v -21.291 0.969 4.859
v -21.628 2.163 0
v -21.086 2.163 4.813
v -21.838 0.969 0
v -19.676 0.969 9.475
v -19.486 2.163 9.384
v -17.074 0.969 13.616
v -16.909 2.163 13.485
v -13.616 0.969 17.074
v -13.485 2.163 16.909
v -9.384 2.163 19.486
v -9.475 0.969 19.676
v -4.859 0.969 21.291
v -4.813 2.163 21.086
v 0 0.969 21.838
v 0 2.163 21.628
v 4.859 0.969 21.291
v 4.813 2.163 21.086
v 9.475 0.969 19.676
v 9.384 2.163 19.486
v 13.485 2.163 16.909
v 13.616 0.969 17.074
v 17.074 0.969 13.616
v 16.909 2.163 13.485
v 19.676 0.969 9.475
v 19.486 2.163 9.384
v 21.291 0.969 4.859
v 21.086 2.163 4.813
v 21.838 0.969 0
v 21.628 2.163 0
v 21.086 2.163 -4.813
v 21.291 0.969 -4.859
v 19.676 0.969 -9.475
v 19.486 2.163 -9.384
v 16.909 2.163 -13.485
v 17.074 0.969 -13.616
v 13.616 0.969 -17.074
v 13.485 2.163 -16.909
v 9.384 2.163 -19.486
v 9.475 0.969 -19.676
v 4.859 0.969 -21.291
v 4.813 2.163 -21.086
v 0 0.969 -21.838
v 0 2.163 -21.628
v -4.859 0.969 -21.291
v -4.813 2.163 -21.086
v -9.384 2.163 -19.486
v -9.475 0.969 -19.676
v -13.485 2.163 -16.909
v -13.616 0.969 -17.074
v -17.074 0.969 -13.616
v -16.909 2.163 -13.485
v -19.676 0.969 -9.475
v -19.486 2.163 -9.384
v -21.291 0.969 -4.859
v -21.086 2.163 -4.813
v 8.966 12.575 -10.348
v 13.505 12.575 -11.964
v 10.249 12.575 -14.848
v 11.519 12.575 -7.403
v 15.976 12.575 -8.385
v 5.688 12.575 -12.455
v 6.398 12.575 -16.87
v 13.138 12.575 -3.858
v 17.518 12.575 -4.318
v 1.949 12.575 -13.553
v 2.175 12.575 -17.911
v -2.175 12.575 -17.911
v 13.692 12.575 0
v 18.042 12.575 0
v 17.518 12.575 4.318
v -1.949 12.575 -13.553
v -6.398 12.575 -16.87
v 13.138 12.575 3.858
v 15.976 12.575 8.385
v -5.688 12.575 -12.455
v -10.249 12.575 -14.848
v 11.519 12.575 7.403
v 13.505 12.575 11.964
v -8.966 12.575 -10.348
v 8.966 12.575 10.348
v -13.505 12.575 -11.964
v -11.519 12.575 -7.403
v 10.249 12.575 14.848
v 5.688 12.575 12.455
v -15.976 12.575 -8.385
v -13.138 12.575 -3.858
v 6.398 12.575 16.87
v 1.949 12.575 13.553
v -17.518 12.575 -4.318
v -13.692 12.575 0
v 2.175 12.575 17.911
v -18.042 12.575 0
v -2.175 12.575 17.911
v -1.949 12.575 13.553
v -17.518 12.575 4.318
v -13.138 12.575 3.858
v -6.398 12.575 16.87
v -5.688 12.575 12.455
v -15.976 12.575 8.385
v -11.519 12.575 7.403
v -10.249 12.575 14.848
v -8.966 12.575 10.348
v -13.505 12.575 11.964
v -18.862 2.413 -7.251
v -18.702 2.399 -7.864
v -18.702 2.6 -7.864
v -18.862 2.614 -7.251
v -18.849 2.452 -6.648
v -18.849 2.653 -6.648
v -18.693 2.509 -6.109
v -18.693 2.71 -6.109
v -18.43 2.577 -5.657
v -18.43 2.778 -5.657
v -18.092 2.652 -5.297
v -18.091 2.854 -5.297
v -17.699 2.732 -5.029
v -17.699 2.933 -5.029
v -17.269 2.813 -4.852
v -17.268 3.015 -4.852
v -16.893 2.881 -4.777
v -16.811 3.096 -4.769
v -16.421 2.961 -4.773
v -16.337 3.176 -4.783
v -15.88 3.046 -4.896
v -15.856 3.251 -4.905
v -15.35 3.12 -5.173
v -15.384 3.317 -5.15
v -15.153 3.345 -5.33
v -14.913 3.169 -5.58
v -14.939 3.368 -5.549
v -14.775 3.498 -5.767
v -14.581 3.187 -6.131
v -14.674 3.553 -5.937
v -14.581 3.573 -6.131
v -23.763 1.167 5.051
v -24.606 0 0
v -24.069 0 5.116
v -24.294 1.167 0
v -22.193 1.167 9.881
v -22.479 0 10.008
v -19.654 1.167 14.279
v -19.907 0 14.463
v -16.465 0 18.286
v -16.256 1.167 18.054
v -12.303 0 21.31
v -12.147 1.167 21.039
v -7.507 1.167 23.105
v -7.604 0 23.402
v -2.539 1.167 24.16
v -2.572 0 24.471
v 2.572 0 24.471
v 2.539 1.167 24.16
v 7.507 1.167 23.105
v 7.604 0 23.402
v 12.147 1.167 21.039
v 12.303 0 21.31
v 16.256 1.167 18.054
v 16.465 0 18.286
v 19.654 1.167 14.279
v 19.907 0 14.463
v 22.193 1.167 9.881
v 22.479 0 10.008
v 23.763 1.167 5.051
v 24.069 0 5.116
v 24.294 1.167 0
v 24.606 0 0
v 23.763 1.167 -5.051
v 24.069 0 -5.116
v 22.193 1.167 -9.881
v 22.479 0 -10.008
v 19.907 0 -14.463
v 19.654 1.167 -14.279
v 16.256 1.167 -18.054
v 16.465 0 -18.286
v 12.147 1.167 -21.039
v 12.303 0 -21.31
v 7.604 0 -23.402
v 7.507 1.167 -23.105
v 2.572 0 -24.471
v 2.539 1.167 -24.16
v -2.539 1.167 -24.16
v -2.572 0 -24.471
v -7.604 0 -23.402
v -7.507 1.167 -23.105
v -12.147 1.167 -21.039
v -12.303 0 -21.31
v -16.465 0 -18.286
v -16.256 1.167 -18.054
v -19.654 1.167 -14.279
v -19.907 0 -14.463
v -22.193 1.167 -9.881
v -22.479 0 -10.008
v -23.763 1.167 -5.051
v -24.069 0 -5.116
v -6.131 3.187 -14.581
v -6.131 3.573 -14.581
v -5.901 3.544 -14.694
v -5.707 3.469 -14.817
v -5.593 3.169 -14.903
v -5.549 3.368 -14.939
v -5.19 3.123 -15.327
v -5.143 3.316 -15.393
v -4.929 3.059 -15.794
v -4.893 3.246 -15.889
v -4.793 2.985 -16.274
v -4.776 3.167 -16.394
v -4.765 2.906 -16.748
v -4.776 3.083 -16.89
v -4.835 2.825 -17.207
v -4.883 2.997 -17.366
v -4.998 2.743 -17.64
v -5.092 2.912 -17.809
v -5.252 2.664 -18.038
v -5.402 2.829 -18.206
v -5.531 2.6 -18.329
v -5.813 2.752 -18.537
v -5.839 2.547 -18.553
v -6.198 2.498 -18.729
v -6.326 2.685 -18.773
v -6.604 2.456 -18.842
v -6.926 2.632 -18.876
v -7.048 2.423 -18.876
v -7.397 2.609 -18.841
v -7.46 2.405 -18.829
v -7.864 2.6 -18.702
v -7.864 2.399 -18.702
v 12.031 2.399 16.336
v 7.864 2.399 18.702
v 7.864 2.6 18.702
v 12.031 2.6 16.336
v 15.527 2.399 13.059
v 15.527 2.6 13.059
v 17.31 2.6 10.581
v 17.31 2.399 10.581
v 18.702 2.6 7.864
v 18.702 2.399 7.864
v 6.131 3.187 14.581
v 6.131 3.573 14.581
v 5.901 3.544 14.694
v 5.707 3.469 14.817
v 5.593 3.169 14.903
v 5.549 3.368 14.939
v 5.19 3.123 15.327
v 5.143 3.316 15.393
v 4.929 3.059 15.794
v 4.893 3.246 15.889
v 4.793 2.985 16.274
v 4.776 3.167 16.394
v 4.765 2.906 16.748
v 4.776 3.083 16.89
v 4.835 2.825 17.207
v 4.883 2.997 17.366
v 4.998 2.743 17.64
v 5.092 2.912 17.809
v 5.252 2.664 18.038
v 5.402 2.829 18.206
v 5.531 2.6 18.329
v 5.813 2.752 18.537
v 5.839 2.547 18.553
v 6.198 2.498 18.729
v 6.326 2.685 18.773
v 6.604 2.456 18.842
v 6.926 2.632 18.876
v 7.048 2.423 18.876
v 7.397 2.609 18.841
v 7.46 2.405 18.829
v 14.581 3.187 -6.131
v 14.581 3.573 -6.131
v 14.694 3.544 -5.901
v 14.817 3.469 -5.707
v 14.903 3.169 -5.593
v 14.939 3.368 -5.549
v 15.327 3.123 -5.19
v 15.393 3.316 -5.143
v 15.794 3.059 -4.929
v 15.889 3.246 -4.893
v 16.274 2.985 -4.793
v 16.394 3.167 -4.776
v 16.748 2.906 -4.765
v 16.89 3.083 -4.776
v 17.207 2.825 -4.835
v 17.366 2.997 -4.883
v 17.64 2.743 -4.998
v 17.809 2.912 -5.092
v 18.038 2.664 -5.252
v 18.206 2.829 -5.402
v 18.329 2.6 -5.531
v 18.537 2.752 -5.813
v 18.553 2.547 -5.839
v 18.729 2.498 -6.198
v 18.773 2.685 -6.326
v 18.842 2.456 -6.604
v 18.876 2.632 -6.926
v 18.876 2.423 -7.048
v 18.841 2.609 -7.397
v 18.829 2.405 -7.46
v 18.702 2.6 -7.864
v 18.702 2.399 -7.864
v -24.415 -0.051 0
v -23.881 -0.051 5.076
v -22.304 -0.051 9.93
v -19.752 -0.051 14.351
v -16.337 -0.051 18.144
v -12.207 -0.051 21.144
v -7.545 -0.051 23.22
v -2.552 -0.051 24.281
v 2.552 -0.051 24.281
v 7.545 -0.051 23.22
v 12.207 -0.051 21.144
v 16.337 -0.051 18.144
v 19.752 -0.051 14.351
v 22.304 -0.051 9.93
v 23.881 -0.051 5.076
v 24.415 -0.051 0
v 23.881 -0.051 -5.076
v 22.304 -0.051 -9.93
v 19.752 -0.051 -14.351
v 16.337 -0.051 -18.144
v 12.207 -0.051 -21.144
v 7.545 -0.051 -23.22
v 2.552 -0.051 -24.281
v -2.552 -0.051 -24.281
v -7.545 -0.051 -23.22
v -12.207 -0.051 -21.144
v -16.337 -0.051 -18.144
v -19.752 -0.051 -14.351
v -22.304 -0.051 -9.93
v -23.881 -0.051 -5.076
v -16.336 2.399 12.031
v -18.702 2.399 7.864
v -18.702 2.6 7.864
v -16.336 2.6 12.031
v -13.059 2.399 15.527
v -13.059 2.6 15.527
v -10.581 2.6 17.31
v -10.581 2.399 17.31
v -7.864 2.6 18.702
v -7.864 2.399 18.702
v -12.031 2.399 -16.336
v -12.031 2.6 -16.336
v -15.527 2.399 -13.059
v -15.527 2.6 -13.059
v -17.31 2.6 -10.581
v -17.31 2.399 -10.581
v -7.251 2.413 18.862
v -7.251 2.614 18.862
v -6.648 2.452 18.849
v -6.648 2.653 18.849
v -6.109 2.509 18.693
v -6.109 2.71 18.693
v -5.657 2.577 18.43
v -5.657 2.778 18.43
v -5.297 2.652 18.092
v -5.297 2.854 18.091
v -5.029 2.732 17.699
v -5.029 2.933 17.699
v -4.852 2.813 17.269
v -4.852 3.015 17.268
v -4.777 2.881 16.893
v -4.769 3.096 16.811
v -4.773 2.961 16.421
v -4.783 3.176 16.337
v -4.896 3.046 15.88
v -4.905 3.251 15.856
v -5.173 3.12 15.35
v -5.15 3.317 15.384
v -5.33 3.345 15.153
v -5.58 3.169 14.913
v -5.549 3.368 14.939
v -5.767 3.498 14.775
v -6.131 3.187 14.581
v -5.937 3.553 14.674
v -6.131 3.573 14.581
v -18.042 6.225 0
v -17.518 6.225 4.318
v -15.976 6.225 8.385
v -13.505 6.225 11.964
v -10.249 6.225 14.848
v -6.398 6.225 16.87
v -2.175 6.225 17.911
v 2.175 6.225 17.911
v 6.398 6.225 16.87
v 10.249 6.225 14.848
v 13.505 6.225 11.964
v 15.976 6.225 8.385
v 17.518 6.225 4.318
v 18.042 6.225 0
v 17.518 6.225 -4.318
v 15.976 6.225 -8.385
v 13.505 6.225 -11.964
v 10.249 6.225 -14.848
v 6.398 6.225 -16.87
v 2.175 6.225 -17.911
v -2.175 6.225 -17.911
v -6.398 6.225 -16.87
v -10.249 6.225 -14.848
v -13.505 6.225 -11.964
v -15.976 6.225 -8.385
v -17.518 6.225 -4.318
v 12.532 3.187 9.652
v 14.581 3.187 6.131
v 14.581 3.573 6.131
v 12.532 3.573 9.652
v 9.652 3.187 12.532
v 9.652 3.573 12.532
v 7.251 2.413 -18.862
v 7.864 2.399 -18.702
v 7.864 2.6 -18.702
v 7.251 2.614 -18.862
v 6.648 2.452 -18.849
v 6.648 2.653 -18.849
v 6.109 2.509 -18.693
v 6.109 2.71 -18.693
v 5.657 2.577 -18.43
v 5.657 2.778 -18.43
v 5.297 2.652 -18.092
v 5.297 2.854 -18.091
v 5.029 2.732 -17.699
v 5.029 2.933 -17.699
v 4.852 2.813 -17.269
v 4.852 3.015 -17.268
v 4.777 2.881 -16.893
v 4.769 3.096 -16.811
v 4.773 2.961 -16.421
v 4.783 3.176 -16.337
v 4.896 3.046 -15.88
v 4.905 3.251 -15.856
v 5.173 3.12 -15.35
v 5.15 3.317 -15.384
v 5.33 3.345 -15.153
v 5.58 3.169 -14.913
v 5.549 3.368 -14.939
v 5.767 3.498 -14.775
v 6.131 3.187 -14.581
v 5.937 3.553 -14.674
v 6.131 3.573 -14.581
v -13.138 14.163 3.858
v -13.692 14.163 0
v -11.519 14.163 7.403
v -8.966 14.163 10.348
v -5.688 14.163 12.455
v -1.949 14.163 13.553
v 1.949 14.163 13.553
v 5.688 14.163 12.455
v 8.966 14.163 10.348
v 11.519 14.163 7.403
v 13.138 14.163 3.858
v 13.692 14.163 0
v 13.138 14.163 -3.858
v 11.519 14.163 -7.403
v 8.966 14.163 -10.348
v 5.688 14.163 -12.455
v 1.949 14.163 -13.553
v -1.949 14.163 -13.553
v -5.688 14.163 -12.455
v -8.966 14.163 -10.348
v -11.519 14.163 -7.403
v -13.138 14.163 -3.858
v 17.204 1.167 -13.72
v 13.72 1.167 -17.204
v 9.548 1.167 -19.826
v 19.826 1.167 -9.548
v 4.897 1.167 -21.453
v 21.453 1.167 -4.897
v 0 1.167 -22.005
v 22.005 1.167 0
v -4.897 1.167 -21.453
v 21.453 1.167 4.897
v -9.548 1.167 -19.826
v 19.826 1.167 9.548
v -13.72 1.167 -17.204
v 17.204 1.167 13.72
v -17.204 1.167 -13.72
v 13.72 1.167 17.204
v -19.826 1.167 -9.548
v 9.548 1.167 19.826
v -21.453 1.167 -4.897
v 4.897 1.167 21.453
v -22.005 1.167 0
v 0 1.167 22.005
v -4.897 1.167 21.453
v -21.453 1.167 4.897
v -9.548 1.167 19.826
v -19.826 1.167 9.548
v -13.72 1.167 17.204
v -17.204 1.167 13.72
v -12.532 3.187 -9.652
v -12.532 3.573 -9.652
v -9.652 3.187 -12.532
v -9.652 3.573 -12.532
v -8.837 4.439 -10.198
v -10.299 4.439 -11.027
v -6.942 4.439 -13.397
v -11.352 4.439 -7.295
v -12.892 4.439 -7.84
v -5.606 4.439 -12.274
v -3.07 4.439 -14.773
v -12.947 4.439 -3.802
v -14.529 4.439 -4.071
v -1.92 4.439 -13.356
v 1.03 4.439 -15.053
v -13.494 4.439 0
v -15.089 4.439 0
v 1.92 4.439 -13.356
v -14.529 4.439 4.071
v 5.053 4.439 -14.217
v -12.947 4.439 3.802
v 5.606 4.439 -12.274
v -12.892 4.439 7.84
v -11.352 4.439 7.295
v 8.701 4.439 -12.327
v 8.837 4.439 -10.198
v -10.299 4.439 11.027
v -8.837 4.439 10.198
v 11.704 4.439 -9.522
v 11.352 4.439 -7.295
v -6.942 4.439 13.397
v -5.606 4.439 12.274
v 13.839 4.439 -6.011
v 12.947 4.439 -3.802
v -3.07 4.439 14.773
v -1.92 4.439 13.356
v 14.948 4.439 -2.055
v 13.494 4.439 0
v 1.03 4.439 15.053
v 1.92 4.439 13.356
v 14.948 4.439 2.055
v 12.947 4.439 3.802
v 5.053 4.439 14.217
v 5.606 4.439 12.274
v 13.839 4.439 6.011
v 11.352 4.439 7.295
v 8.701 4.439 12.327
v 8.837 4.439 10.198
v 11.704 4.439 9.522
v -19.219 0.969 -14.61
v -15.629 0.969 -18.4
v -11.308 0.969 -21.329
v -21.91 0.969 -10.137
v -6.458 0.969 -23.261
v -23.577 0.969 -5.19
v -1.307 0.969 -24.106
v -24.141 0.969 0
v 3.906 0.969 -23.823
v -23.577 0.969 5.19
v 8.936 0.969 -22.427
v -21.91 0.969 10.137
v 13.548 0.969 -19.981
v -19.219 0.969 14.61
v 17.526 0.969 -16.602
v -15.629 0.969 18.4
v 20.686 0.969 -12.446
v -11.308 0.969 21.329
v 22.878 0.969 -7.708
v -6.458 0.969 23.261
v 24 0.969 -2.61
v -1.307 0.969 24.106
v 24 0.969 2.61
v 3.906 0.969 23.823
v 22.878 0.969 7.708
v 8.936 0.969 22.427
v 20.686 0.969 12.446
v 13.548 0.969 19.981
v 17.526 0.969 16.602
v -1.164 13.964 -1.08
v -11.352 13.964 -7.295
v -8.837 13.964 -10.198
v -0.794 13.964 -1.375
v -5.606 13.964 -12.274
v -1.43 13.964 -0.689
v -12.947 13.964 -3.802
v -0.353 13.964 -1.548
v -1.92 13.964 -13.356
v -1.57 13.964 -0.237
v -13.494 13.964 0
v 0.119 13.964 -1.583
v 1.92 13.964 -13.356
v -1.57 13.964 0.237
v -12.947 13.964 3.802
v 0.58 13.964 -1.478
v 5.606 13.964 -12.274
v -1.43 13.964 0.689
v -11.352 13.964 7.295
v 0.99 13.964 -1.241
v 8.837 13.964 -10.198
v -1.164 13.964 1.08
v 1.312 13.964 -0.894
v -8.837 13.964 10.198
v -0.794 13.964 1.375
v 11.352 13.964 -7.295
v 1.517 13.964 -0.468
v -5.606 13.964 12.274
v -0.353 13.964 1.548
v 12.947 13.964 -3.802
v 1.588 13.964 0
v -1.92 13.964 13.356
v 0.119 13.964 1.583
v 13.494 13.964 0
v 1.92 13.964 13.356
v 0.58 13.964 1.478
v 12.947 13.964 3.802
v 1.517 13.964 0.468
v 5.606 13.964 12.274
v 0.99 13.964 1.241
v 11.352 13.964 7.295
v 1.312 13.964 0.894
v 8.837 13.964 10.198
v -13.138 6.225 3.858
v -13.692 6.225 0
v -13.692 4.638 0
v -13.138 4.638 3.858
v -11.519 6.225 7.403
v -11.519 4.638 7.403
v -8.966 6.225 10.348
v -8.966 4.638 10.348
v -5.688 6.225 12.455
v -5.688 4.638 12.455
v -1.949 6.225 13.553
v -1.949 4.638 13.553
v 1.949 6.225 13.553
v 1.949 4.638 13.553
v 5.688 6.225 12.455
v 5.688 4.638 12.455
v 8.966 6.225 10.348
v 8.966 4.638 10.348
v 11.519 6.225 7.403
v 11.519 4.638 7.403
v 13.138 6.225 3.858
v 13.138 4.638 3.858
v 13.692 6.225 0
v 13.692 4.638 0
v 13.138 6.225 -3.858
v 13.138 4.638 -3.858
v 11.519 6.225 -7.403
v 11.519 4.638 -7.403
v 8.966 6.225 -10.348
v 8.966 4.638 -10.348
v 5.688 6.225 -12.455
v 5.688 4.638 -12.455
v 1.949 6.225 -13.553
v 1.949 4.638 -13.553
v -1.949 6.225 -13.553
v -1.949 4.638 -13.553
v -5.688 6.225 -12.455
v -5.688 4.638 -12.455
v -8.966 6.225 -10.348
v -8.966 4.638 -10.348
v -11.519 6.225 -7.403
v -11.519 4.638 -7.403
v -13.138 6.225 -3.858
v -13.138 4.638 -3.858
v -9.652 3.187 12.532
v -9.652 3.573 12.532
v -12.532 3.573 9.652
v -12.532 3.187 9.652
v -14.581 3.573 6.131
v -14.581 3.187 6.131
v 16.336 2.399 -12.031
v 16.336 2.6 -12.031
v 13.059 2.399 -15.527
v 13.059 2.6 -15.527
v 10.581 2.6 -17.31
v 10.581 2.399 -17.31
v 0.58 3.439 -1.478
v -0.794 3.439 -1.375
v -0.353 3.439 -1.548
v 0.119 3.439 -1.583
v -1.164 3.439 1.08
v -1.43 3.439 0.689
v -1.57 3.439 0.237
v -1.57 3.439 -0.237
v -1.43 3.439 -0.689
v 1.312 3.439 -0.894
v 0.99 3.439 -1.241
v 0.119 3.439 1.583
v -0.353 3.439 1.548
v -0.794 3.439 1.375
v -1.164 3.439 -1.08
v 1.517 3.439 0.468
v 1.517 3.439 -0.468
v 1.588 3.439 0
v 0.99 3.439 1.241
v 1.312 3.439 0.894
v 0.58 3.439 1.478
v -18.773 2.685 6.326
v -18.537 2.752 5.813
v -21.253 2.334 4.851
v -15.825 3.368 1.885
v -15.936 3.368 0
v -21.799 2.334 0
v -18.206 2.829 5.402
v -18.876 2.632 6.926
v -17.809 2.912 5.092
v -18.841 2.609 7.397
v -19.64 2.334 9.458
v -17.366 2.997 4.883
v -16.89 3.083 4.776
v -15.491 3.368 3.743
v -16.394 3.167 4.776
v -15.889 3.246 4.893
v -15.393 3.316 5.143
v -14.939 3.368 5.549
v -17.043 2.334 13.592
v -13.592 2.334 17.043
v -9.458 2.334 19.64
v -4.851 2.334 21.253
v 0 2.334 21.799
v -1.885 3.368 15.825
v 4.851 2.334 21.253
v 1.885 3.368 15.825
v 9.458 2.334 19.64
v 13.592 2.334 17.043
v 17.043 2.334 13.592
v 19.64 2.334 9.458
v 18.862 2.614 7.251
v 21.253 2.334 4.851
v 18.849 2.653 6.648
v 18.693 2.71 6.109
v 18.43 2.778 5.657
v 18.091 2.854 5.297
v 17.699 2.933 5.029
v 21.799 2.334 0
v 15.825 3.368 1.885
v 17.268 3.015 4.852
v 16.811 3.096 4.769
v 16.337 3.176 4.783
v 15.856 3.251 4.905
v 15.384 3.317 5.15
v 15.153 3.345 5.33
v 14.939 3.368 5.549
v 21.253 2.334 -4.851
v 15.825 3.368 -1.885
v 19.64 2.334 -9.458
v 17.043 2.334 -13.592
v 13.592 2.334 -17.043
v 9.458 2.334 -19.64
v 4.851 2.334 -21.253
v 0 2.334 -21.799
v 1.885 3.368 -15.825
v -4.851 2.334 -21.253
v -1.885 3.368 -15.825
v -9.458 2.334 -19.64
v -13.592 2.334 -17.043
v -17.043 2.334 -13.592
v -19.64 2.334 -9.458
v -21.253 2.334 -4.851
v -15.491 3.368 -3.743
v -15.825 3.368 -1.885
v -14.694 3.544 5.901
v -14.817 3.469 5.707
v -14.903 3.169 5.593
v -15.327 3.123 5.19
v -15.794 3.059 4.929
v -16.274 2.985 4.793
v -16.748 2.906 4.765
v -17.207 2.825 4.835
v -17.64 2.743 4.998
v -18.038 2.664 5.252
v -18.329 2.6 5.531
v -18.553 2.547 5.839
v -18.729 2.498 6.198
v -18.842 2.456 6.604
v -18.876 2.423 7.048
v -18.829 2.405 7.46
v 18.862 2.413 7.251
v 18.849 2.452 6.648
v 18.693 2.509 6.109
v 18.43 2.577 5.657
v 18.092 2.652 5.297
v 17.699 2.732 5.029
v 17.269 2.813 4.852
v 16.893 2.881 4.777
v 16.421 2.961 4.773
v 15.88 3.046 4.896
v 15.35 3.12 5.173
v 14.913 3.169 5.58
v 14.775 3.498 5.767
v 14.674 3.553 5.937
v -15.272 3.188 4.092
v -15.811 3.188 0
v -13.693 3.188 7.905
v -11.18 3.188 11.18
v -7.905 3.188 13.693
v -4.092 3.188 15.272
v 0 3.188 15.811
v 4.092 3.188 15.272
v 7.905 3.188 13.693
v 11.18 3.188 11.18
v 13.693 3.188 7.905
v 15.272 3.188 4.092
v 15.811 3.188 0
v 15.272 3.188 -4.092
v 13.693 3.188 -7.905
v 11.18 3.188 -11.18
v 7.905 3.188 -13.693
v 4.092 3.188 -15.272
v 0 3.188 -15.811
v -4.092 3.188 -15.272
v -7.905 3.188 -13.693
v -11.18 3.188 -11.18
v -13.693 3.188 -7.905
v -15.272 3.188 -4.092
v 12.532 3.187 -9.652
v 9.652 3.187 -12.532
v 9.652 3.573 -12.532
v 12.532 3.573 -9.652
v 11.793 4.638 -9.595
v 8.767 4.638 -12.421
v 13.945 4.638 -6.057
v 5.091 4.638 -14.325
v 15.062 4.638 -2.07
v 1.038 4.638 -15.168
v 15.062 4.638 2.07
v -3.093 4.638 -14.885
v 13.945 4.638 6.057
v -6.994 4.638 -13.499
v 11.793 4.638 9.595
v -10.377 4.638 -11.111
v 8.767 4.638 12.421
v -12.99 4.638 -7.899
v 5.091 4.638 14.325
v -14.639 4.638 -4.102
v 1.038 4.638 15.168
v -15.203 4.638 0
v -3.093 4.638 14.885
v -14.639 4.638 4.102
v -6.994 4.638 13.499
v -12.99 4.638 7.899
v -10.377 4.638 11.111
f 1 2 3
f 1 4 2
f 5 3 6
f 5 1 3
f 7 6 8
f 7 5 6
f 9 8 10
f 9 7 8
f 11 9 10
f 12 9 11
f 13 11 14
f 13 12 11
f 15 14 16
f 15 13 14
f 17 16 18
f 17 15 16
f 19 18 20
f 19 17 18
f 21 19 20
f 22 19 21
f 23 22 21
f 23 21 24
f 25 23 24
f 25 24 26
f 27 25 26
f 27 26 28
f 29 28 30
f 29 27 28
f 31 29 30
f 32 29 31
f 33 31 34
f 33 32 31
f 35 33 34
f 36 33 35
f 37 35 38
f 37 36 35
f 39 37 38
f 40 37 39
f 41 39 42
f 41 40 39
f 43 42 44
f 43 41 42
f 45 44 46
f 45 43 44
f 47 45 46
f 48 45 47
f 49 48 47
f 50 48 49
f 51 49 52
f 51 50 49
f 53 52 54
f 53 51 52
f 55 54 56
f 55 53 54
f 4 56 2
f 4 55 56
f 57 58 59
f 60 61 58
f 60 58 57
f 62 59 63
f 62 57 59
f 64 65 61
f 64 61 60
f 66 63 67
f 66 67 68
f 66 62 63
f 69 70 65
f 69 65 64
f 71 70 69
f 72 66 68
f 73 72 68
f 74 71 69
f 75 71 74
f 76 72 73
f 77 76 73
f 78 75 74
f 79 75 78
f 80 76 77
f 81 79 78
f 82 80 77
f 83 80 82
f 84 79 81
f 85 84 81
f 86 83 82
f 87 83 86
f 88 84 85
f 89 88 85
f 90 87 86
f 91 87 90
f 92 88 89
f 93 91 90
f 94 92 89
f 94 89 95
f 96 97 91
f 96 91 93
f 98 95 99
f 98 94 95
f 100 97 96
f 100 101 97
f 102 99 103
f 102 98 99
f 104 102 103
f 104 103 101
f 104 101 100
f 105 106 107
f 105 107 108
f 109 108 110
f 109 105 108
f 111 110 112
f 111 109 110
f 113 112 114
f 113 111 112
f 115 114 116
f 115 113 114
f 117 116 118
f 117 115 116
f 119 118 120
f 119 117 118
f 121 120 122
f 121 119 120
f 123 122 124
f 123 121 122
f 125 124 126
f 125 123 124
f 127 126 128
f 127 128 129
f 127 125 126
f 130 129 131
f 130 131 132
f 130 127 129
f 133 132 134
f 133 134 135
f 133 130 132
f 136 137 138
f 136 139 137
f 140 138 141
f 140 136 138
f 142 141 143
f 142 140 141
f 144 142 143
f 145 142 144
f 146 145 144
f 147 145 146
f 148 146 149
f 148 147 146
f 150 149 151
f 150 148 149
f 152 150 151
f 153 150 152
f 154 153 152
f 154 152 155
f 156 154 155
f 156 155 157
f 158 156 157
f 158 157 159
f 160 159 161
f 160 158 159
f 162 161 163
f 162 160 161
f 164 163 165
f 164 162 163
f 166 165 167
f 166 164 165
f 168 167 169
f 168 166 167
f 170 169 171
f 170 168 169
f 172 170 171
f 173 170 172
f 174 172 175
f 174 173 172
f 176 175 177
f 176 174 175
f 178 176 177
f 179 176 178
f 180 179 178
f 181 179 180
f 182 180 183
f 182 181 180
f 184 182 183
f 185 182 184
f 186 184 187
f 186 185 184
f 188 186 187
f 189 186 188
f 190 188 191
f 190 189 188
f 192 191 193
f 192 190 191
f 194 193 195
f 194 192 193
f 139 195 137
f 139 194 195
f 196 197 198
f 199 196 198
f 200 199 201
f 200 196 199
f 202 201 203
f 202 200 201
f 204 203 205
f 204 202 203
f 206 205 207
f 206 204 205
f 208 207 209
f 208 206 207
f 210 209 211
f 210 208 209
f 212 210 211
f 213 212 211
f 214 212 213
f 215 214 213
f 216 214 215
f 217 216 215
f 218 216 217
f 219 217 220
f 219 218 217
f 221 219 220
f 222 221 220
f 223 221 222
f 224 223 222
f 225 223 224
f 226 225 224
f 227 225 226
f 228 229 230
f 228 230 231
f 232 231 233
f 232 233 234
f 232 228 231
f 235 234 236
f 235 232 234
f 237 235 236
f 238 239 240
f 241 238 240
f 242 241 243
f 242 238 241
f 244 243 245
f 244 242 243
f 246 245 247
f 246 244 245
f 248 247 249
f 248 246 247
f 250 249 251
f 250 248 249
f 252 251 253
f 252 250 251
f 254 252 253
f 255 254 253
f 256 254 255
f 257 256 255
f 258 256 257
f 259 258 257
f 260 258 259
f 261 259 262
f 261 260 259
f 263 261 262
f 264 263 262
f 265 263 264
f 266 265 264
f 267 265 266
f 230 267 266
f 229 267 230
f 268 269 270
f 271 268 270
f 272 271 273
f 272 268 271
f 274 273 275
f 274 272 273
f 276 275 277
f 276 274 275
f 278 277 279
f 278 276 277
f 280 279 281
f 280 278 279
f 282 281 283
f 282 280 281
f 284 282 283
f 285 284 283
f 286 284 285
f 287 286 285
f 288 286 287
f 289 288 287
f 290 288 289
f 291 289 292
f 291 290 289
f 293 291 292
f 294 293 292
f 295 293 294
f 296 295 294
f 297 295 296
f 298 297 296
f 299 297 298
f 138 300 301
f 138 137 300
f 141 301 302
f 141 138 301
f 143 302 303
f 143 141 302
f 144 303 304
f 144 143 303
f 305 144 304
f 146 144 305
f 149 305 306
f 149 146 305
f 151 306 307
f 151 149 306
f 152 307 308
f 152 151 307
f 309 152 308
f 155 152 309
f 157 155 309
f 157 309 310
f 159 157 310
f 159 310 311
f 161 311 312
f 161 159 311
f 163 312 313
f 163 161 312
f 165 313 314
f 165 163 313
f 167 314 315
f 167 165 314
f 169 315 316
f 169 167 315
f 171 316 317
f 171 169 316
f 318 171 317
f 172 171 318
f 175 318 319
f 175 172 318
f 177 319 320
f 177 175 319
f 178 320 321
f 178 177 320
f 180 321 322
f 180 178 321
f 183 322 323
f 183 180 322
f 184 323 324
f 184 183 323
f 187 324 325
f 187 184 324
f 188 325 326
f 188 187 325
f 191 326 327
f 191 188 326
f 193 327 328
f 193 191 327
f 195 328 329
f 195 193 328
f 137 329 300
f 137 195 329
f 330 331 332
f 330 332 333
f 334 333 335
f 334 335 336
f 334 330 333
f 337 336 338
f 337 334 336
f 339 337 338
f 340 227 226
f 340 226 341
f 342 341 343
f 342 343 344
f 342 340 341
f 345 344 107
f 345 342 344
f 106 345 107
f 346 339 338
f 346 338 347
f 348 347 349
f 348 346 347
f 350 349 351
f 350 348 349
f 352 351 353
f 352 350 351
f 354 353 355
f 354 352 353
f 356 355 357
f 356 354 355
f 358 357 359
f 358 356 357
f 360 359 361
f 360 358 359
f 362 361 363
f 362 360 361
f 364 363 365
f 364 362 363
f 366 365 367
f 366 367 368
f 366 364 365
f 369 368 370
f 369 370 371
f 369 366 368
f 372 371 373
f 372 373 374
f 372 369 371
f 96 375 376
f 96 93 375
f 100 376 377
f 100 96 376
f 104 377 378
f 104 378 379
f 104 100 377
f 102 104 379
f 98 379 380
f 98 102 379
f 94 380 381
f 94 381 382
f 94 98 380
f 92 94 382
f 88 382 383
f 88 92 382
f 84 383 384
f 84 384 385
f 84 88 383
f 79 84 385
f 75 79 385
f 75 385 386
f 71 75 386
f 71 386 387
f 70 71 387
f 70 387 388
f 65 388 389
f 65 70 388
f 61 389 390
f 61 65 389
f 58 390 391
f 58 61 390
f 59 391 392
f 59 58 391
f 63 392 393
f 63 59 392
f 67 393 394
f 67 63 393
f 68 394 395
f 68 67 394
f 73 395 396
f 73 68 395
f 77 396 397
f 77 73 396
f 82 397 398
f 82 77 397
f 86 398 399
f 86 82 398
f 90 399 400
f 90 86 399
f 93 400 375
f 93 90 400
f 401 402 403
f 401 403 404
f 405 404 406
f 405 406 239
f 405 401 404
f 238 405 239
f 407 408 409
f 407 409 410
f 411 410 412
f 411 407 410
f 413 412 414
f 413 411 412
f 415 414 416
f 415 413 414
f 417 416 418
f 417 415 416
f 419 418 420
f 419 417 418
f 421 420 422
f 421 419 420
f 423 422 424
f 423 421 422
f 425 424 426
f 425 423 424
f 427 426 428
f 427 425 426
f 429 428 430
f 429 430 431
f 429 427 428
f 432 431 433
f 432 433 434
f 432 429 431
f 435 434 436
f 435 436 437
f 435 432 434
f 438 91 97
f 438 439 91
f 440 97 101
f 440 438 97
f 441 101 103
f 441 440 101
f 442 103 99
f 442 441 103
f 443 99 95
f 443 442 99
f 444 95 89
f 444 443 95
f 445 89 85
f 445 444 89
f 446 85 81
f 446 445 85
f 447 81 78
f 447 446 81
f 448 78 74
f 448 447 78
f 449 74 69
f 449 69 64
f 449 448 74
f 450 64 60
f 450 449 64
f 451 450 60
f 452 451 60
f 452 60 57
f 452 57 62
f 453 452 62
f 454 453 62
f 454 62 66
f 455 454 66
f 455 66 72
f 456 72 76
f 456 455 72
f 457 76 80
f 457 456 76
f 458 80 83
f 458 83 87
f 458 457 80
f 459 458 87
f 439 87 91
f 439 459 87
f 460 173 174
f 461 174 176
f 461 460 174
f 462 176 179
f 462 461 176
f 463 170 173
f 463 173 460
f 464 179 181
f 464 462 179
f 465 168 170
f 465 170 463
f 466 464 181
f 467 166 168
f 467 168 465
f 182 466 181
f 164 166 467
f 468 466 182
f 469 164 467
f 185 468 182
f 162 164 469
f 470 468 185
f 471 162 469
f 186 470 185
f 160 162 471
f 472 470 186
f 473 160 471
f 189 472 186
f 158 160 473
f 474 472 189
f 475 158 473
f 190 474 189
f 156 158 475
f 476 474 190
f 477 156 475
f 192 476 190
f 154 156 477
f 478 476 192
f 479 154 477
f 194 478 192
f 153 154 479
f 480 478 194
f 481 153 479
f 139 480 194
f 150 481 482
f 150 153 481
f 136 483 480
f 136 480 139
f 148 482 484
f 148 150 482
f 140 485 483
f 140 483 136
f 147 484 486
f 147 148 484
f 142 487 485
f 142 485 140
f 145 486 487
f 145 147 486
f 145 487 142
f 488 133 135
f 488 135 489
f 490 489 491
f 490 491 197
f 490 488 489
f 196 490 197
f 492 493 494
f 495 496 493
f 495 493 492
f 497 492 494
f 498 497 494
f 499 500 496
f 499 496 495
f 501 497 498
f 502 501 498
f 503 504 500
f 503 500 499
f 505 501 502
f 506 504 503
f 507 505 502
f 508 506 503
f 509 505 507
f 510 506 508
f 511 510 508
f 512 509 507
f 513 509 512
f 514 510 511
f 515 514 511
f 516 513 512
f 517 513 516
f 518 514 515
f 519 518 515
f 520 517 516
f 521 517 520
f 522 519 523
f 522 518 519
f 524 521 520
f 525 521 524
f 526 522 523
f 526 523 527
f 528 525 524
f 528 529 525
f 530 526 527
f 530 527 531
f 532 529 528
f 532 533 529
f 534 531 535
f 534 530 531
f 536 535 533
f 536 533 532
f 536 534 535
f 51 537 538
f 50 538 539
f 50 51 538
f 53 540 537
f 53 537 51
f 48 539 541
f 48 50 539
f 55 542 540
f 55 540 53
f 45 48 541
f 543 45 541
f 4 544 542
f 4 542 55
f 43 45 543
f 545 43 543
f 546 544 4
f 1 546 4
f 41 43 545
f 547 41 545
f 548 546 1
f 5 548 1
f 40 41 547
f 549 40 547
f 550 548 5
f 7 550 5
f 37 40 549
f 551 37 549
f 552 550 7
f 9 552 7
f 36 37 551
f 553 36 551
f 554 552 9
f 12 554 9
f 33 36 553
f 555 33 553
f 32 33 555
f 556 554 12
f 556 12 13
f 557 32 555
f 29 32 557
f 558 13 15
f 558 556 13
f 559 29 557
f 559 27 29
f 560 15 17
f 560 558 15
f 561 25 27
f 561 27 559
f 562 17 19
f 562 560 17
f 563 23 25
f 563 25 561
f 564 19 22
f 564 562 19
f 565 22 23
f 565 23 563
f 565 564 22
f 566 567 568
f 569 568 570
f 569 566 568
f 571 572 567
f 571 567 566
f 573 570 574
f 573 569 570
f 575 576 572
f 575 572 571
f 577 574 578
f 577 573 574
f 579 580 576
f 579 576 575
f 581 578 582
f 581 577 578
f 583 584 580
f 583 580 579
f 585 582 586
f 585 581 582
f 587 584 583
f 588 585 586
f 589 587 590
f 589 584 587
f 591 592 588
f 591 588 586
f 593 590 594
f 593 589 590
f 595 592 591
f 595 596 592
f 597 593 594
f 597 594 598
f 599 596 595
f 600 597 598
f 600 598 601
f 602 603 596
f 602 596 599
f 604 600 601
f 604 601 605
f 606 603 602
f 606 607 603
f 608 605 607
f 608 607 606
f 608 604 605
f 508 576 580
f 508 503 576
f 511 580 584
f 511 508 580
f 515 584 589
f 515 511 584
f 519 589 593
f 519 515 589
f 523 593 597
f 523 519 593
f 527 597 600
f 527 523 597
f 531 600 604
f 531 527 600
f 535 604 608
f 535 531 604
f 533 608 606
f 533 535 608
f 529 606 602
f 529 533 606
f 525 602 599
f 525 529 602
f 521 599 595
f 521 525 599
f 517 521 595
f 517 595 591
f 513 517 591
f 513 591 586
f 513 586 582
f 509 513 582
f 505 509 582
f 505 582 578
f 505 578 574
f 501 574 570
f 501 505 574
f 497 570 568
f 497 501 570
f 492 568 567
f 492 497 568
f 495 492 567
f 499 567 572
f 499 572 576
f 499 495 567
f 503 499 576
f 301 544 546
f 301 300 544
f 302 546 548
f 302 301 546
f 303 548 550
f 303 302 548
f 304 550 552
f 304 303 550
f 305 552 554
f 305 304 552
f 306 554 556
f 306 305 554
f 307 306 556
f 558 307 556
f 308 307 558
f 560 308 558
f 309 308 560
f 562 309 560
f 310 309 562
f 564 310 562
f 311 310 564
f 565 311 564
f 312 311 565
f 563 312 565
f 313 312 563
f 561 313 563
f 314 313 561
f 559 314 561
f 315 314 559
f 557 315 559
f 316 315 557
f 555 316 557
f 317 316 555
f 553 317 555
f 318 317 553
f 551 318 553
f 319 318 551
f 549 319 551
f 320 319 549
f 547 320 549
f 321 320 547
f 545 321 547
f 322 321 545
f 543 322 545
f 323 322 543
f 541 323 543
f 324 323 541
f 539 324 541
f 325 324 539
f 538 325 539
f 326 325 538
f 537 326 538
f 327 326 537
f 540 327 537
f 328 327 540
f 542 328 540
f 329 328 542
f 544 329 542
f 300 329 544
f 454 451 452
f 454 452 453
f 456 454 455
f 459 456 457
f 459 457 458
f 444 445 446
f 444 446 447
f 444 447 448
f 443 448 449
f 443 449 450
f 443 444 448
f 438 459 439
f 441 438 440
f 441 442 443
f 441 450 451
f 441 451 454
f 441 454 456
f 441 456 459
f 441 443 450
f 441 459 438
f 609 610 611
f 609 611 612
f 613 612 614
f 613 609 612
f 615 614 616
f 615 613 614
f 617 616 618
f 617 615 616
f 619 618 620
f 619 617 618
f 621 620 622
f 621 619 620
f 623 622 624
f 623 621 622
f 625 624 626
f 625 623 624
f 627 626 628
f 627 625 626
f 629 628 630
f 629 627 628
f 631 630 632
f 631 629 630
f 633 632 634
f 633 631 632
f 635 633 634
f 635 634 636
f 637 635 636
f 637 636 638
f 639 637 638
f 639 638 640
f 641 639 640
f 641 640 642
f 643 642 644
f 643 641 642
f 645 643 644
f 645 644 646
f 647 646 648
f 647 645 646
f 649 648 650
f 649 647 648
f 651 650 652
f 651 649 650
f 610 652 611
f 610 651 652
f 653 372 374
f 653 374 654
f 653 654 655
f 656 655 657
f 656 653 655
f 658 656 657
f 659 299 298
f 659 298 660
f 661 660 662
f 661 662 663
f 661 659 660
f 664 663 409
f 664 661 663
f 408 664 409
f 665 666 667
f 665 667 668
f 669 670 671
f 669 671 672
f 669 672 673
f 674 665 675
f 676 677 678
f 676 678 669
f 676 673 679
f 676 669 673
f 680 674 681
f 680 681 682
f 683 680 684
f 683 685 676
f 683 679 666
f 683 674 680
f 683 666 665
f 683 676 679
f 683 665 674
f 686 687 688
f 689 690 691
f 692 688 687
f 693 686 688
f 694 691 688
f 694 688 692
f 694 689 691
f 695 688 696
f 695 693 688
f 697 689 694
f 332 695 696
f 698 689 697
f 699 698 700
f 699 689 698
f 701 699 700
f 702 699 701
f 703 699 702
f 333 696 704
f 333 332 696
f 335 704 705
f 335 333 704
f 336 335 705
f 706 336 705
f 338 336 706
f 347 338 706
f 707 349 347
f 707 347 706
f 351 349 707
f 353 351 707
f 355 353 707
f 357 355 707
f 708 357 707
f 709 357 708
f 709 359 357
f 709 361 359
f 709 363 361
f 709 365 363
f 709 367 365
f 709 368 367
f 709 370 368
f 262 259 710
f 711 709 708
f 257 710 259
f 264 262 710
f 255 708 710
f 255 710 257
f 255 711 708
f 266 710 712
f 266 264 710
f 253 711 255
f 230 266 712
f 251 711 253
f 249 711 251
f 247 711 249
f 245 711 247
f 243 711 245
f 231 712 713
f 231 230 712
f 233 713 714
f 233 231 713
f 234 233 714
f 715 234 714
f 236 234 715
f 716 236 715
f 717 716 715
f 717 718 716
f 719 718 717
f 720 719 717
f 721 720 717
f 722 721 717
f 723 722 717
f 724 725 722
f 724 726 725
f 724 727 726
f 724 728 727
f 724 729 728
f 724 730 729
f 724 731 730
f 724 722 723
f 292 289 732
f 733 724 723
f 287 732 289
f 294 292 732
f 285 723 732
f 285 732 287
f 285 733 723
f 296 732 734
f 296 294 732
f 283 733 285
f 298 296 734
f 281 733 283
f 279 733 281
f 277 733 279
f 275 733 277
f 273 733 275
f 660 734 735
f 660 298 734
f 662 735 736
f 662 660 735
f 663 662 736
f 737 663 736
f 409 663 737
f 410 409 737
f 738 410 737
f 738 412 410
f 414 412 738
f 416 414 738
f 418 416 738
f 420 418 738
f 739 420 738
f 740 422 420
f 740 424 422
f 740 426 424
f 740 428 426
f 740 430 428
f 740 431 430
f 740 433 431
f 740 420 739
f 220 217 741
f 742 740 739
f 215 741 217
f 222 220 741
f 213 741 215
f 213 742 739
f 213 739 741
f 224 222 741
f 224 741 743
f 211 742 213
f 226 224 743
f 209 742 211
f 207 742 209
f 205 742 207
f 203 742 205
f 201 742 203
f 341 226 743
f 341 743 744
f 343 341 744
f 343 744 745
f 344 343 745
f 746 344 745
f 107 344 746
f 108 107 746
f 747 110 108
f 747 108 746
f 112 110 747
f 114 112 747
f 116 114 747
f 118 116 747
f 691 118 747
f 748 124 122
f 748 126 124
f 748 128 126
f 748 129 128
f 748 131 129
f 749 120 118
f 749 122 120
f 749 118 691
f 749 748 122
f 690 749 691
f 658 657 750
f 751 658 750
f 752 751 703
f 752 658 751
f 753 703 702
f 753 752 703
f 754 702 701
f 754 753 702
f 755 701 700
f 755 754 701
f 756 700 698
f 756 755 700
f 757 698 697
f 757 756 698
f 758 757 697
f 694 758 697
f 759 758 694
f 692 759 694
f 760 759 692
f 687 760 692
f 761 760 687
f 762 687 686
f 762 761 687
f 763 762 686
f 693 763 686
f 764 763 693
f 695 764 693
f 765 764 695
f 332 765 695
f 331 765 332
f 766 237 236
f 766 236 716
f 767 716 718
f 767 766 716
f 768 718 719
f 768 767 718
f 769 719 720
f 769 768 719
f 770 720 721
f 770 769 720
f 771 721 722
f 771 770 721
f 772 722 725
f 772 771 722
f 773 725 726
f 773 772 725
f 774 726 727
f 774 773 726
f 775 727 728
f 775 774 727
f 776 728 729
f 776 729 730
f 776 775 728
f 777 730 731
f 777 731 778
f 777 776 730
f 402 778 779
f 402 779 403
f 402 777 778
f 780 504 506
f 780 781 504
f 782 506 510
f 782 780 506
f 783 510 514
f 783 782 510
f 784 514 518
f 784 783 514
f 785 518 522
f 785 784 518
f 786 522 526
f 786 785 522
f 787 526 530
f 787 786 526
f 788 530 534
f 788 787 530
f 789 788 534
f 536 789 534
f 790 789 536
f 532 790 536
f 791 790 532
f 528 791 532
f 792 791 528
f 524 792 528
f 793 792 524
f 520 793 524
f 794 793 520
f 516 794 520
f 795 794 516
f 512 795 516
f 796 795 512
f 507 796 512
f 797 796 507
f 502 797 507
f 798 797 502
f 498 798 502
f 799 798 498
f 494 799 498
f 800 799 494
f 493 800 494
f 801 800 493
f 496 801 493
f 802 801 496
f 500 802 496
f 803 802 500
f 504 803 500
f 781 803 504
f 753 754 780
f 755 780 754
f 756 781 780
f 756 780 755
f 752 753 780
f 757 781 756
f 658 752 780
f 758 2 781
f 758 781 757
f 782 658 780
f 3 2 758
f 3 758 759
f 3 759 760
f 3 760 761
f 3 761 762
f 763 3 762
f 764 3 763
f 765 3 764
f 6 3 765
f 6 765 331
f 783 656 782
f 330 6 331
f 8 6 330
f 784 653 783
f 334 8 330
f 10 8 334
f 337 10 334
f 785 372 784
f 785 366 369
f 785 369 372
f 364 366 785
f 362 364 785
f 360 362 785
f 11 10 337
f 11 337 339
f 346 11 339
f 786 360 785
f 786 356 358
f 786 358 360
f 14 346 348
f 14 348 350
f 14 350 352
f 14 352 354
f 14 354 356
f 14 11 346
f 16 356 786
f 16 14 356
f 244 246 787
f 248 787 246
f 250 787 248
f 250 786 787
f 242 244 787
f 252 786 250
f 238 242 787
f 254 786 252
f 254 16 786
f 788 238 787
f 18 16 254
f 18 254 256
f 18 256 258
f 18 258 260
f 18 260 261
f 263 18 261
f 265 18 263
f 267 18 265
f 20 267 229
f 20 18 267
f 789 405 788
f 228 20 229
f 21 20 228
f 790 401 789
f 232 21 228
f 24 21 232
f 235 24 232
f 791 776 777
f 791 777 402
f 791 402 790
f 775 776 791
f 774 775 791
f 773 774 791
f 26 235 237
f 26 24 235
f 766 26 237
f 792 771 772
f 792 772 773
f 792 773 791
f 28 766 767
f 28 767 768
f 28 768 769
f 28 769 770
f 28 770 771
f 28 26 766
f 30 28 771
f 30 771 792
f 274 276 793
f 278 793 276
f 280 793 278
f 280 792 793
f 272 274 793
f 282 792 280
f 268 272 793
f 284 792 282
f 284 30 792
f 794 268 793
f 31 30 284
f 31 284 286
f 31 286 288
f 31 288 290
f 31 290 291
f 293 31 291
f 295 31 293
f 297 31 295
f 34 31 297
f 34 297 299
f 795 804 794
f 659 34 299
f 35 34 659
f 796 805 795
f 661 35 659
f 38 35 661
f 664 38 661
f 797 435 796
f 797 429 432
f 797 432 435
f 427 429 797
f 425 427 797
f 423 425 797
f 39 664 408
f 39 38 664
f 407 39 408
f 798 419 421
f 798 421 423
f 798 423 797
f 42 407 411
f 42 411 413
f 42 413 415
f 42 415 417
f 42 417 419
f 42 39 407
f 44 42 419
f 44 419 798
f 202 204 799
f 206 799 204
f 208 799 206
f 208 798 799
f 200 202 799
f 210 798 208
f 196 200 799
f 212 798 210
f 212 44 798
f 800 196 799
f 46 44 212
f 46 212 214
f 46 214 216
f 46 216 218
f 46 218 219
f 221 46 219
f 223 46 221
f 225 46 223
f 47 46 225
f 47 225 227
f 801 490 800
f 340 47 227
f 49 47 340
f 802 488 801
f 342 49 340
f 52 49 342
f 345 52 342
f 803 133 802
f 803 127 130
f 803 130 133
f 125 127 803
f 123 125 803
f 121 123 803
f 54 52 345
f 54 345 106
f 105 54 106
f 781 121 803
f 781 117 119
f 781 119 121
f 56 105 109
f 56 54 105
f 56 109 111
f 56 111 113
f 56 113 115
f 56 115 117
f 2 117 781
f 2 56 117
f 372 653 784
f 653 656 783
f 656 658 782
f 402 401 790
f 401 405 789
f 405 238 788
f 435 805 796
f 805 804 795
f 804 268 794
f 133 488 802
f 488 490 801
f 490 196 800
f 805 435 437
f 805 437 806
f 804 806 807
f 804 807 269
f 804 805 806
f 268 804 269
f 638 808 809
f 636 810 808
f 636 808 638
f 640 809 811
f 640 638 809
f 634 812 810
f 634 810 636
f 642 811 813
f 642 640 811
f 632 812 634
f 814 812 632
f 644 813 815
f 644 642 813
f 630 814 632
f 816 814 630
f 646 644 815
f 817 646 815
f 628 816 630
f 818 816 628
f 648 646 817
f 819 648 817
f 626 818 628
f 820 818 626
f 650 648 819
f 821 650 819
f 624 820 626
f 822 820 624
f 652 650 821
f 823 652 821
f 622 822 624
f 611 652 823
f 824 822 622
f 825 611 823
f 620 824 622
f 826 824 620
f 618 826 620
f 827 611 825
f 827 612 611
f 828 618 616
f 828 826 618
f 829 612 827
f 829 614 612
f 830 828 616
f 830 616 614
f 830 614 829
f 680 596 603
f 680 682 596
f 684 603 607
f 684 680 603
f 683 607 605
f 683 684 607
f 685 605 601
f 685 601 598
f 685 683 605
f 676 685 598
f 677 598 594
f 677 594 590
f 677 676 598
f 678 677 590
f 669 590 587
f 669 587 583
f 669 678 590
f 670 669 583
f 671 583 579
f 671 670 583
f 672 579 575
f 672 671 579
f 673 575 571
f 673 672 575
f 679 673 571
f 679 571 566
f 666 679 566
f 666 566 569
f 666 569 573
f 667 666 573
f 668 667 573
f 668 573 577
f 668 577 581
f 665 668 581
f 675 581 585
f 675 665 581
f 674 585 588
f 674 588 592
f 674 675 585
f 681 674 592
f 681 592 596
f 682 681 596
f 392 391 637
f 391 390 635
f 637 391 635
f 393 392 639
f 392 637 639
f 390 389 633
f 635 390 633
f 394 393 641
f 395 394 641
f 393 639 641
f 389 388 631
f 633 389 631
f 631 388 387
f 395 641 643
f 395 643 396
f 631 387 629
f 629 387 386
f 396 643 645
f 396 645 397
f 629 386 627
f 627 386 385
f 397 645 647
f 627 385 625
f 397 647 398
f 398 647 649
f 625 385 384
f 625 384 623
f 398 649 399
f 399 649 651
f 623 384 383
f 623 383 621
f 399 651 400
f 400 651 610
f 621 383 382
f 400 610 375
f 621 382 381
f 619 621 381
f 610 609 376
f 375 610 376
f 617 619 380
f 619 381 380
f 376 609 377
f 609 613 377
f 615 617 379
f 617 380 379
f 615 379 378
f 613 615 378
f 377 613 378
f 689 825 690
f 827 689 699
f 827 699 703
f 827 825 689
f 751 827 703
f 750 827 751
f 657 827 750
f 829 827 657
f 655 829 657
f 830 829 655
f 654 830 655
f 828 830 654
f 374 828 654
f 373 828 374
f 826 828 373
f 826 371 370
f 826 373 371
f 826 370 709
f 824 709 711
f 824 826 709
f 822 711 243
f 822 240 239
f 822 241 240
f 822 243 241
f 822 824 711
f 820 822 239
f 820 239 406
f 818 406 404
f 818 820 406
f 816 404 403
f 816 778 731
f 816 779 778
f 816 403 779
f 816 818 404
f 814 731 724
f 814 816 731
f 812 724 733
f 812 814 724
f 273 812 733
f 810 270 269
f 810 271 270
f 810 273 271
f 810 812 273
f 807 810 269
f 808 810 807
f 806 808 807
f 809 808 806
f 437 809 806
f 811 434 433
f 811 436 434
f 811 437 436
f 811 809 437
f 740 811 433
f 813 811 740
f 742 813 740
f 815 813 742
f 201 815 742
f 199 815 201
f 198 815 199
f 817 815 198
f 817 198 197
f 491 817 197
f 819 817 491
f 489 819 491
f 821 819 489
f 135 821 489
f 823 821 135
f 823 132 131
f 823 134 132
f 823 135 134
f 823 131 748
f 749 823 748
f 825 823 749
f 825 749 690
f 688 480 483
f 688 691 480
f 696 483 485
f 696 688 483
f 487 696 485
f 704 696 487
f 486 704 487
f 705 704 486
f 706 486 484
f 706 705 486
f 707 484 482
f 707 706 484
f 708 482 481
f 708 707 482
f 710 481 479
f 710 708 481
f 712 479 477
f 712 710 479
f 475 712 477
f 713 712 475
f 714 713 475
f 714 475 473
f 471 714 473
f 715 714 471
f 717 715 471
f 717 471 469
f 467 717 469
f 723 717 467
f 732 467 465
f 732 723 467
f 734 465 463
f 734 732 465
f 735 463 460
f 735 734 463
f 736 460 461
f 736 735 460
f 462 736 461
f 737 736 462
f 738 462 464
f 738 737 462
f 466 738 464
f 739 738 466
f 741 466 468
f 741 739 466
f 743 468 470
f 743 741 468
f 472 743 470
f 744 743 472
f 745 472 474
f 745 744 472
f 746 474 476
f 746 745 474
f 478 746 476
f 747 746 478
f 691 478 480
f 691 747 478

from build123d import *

# Parameters (mm, degrees)
CUT_EXTRUDE2_DEPTH       = 15.16264375
SKETCH5_W                = 4.35
SKETCH5_H                = 6.35
SKETCH6_R                = 1.5875
BOSS_EXTRUDE2_DEPTH      = 1
BOSS_EXTRUDE2_DEPTH_BACK = 9.525


with BuildPart() as part:
    # Sketch2 → Revolve-Thin1 (revolve)
    with BuildSketch(Plane.XY):
        Polygon((-24.60625, 0), (-24.293567435, 1.166947221), (-22.00484761, 1.166947221), (-21.79908333, 2.333894442), (-15.936399675, 3.36764375), (-15.203164833, 4.63764375), (-13.6921875, 4.63764375), (-13.6921875, 14.16264375), (0, 14.16264375), (0, 13.96420625), (-13.49375, 13.96420625), (-13.49375, 4.43920625), (-15.088596889, 4.43920625), (-15.810814222, 3.188289135), (-21.62778851, 2.162599622), (-21.838338777, 0.968509721), (-24.141300985, 0.968509721), (-24.414574094, -0.051359404), align=None)
    revolve(axis=Axis((0, 0, 0), (0, 1, 0)))

    # Sketch4 → Cut-Extrude2 (cut, through all)
    with BuildSketch(Plane(origin=(0, 0, 0), x_dir=(1, 0, 0), z_dir=(0, 1, 0))):
        with BuildLine():
            ThreePointArc((-18.702022535, -7.864281481), (-14.345950127, -14.345950127), (-7.864281481, -18.702022535))
            ThreePointArc((-7.864281481, -18.702022535), (-4.937265584, -17.507944491), (-6.131343629, -14.580928594))
            ThreePointArc((-6.131343629, -14.580928594), (-11.184740796, -11.184740796), (-14.580928594, -6.131343629))
            ThreePointArc((-14.580928594, -6.131343629), (-17.507944491, -4.937265584), (-18.702022535, -7.864281481))
        make_face()
        with BuildLine():
            ThreePointArc((-7.864281481, 18.702022535), (-14.345950127, 14.345950127), (-18.702022535, 7.864281481))
            ThreePointArc((-18.702022535, 7.864281481), (-17.507944491, 4.937265584), (-14.580928594, 6.131343629))
            ThreePointArc((-14.580928594, 6.131343629), (-11.184740796, 11.184740796), (-6.131343629, 14.580928594))
            ThreePointArc((-6.131343629, 14.580928594), (-4.937265584, 17.507944491), (-7.864281481, 18.702022535))
        make_face()
        with BuildLine():
            ThreePointArc((18.702022535, 7.864281481), (14.345950127, 14.345950127), (7.864281481, 18.702022535))
            ThreePointArc((7.864281481, 18.702022535), (4.937265584, 17.507944491), (6.131343629, 14.580928594))
            ThreePointArc((6.131343629, 14.580928594), (11.184740796, 11.184740796), (14.580928594, 6.131343629))
            ThreePointArc((14.580928594, 6.131343629), (17.507944491, 4.937265584), (18.702022535, 7.864281481))
        make_face()
        with BuildLine():
            ThreePointArc((7.864281481, -18.702022535), (14.345950127, -14.345950127), (18.702022535, -7.864281481))
            ThreePointArc((18.702022535, -7.864281481), (17.507944491, -4.937265584), (14.580928594, -6.131343629))
            ThreePointArc((14.580928594, -6.131343629), (11.184740796, -11.184740796), (6.131343629, -14.580928594))
            ThreePointArc((6.131343629, -14.580928594), (4.937265584, -17.507944491), (7.864281481, -18.702022535))
        make_face()
    extrude(amount=CUT_EXTRUDE2_DEPTH, mode=Mode.SUBTRACT)

    # Sketch5 → Revolve1 (revolve)
    with BuildSketch(Plane.XY):
        with Locations((-15.8671875, 9.40014375)):
            Rectangle(SKETCH5_W, SKETCH5_H)
    revolve(axis=Axis((0, 0, 0), (0, 1, 0)))

    # Sketch6 → Boss-Extrude2 (add, two sides)
    with BuildSketch(Plane.XZ.offset(-4.43920625)) as boss_extrude2_sk:
        Circle(SKETCH6_R)
    extrude(amount=BOSS_EXTRUDE2_DEPTH)
    extrude(boss_extrude2_sk.sketch, amount=-BOSS_EXTRUDE2_DEPTH_BACK)


solid = part.part
